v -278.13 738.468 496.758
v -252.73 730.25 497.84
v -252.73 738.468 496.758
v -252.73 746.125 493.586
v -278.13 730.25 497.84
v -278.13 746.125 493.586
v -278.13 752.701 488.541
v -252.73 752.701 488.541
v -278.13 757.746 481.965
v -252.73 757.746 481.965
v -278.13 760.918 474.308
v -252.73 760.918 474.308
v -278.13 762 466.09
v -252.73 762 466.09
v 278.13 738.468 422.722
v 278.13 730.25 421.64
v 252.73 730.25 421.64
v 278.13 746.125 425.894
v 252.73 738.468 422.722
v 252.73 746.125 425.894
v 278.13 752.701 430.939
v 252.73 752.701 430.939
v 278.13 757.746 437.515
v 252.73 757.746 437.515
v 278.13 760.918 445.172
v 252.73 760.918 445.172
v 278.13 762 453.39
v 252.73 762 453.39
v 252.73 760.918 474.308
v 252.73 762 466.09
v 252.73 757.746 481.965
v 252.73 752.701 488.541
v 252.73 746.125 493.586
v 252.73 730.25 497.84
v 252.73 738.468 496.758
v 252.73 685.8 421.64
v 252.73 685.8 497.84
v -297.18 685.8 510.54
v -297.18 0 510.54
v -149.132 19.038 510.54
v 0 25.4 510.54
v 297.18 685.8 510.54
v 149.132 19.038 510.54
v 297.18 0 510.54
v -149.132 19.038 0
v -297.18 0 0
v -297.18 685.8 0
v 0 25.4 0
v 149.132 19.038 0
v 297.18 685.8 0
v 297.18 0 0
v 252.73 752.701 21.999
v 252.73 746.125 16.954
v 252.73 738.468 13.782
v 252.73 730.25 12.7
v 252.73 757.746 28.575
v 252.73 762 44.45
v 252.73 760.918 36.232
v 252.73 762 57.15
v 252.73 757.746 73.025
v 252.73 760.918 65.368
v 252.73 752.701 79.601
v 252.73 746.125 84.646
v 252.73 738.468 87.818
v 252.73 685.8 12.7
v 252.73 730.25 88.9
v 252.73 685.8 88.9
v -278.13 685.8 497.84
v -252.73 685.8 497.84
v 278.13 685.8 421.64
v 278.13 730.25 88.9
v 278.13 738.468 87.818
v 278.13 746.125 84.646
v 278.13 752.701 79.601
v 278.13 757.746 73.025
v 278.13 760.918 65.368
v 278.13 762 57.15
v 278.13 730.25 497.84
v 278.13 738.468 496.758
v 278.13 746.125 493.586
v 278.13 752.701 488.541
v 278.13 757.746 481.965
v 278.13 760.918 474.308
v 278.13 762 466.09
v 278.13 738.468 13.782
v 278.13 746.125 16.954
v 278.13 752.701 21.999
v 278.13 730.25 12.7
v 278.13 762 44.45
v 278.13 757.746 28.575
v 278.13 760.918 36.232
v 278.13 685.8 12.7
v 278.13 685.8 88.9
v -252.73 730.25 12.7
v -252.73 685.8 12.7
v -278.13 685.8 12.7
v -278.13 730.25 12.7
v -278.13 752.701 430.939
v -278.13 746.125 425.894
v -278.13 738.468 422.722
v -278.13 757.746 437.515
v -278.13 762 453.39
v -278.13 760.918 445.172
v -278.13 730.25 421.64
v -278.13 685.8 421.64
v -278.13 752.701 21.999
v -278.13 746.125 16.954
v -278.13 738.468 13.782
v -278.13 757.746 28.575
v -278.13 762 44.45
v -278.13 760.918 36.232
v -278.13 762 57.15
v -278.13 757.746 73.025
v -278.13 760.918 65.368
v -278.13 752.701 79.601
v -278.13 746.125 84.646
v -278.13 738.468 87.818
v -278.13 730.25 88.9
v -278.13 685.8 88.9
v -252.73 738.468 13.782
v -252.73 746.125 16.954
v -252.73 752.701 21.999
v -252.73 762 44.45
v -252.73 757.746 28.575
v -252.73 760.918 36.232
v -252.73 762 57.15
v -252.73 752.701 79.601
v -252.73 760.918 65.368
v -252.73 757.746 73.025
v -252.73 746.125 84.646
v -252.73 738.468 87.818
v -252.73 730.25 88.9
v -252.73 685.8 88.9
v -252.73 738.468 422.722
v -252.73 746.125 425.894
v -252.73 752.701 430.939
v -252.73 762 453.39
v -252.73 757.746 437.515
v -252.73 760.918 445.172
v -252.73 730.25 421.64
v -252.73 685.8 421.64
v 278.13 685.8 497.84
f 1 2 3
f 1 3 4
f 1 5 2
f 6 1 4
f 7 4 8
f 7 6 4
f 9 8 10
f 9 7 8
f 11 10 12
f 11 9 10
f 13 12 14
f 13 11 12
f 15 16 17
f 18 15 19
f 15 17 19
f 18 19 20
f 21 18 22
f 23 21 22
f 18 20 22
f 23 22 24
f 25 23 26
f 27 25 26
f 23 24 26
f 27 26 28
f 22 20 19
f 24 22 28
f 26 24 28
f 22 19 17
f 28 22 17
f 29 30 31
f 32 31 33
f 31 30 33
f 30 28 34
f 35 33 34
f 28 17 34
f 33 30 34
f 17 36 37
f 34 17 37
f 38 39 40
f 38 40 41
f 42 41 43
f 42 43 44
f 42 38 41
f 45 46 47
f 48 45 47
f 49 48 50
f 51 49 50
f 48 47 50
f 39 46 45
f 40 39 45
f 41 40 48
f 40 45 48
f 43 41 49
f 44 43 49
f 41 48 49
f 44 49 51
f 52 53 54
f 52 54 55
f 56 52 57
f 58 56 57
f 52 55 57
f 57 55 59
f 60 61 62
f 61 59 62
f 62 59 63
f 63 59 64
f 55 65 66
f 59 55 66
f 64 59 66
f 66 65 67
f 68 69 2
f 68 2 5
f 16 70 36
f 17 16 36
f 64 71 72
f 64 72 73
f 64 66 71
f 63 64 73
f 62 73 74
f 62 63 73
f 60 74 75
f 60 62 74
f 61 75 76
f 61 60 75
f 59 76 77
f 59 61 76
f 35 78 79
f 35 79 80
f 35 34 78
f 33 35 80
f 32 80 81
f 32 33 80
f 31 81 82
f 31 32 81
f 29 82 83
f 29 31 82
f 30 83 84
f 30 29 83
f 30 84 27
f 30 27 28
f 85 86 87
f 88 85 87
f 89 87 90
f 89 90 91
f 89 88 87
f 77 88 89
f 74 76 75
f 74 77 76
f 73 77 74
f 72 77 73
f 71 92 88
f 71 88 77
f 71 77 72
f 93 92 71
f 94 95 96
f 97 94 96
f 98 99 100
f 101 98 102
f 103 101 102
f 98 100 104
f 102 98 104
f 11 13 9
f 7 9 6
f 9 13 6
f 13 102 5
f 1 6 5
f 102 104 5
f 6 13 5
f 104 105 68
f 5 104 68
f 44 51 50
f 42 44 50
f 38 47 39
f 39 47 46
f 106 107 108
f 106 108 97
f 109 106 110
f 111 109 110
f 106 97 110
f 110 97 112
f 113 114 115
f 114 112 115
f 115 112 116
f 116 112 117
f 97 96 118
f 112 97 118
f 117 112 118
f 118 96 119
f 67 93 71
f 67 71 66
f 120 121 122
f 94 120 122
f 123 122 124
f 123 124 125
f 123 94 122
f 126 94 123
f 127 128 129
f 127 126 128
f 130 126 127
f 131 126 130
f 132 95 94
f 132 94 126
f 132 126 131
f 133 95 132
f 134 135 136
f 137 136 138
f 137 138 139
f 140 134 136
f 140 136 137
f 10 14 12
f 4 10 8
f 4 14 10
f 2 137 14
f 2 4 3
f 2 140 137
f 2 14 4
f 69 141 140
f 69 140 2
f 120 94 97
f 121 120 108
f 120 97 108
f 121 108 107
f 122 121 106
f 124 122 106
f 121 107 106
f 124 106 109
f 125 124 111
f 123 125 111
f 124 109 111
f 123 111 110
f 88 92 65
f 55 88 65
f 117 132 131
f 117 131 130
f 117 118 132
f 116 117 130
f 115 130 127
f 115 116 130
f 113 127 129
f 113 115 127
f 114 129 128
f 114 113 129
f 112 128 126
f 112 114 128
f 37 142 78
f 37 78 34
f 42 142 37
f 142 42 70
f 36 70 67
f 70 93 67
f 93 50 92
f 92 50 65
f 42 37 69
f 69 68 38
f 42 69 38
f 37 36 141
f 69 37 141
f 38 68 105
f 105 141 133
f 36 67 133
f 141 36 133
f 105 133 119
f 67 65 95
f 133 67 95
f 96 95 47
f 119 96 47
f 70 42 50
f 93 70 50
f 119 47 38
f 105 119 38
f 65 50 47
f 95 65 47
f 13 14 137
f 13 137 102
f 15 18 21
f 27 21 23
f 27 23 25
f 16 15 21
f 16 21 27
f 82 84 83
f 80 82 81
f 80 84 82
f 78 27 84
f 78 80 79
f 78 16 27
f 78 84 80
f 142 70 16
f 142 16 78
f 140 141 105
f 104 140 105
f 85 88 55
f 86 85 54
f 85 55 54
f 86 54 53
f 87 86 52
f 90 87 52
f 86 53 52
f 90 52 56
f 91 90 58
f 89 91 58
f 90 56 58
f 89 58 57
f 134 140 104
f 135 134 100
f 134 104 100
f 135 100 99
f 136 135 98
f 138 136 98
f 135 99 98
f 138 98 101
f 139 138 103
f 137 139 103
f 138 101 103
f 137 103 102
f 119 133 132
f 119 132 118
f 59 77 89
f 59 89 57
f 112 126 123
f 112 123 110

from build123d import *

# Parameters (mm, degrees)
F1_DEPTH = 510.54
F2_W     = 25.4
F2_H     = 76.2
F3_DEPTH = 76.2
F4_R     = 31.75


with BuildPart() as f1:
    # F0 (on Top) → F1 (new body)
    with BuildSketch(Plane.XY):
        with BuildLine():
            Line((297.18, 685.8), (-297.18, 685.8))
            Line((-297.18, 685.8), (-297.18, 0))
            ThreePointArc((-297.18, 0), (0, 25.4), (297.18, 0))
            Line((297.18, 0), (297.18, 685.8))
        make_face()
    extrude(amount=F1_DEPTH)

    # F2 (on face) → F3 (join)
    with BuildSketch(Plane(origin=(0, 685.8, 0), x_dir=(-1, 0, 0), z_dir=(0, 1, 0))):
        with Locations((-265.43, 459.74)):
            Rectangle(F2_W, F2_H)
        with Locations((265.43, 459.74)):
            Rectangle(F2_W, F2_H)
        with Locations((-265.43, 50.8)):
            Rectangle(F2_W, F2_H)
        with Locations((265.43, 50.8)):
            Rectangle(F2_W, F2_H)
    extrude(amount=F3_DEPTH)

    # F4
    f4_edges = [f1.edges().sort_by_distance(p)[0] for p in [
        (265.43, 762, 497.84),
        (265.43, 762, 421.64),
        (265.43, 762, 88.9),
        (-265.43, 762, 12.7),
        (-265.43, 762, 88.9),
        (-265.43, 762, 421.64),
        (-265.43, 762, 497.84),
        (265.43, 762, 12.7),
    ]]
    fillet(f4_edges, radius=F4_R)


solid = f1.part
